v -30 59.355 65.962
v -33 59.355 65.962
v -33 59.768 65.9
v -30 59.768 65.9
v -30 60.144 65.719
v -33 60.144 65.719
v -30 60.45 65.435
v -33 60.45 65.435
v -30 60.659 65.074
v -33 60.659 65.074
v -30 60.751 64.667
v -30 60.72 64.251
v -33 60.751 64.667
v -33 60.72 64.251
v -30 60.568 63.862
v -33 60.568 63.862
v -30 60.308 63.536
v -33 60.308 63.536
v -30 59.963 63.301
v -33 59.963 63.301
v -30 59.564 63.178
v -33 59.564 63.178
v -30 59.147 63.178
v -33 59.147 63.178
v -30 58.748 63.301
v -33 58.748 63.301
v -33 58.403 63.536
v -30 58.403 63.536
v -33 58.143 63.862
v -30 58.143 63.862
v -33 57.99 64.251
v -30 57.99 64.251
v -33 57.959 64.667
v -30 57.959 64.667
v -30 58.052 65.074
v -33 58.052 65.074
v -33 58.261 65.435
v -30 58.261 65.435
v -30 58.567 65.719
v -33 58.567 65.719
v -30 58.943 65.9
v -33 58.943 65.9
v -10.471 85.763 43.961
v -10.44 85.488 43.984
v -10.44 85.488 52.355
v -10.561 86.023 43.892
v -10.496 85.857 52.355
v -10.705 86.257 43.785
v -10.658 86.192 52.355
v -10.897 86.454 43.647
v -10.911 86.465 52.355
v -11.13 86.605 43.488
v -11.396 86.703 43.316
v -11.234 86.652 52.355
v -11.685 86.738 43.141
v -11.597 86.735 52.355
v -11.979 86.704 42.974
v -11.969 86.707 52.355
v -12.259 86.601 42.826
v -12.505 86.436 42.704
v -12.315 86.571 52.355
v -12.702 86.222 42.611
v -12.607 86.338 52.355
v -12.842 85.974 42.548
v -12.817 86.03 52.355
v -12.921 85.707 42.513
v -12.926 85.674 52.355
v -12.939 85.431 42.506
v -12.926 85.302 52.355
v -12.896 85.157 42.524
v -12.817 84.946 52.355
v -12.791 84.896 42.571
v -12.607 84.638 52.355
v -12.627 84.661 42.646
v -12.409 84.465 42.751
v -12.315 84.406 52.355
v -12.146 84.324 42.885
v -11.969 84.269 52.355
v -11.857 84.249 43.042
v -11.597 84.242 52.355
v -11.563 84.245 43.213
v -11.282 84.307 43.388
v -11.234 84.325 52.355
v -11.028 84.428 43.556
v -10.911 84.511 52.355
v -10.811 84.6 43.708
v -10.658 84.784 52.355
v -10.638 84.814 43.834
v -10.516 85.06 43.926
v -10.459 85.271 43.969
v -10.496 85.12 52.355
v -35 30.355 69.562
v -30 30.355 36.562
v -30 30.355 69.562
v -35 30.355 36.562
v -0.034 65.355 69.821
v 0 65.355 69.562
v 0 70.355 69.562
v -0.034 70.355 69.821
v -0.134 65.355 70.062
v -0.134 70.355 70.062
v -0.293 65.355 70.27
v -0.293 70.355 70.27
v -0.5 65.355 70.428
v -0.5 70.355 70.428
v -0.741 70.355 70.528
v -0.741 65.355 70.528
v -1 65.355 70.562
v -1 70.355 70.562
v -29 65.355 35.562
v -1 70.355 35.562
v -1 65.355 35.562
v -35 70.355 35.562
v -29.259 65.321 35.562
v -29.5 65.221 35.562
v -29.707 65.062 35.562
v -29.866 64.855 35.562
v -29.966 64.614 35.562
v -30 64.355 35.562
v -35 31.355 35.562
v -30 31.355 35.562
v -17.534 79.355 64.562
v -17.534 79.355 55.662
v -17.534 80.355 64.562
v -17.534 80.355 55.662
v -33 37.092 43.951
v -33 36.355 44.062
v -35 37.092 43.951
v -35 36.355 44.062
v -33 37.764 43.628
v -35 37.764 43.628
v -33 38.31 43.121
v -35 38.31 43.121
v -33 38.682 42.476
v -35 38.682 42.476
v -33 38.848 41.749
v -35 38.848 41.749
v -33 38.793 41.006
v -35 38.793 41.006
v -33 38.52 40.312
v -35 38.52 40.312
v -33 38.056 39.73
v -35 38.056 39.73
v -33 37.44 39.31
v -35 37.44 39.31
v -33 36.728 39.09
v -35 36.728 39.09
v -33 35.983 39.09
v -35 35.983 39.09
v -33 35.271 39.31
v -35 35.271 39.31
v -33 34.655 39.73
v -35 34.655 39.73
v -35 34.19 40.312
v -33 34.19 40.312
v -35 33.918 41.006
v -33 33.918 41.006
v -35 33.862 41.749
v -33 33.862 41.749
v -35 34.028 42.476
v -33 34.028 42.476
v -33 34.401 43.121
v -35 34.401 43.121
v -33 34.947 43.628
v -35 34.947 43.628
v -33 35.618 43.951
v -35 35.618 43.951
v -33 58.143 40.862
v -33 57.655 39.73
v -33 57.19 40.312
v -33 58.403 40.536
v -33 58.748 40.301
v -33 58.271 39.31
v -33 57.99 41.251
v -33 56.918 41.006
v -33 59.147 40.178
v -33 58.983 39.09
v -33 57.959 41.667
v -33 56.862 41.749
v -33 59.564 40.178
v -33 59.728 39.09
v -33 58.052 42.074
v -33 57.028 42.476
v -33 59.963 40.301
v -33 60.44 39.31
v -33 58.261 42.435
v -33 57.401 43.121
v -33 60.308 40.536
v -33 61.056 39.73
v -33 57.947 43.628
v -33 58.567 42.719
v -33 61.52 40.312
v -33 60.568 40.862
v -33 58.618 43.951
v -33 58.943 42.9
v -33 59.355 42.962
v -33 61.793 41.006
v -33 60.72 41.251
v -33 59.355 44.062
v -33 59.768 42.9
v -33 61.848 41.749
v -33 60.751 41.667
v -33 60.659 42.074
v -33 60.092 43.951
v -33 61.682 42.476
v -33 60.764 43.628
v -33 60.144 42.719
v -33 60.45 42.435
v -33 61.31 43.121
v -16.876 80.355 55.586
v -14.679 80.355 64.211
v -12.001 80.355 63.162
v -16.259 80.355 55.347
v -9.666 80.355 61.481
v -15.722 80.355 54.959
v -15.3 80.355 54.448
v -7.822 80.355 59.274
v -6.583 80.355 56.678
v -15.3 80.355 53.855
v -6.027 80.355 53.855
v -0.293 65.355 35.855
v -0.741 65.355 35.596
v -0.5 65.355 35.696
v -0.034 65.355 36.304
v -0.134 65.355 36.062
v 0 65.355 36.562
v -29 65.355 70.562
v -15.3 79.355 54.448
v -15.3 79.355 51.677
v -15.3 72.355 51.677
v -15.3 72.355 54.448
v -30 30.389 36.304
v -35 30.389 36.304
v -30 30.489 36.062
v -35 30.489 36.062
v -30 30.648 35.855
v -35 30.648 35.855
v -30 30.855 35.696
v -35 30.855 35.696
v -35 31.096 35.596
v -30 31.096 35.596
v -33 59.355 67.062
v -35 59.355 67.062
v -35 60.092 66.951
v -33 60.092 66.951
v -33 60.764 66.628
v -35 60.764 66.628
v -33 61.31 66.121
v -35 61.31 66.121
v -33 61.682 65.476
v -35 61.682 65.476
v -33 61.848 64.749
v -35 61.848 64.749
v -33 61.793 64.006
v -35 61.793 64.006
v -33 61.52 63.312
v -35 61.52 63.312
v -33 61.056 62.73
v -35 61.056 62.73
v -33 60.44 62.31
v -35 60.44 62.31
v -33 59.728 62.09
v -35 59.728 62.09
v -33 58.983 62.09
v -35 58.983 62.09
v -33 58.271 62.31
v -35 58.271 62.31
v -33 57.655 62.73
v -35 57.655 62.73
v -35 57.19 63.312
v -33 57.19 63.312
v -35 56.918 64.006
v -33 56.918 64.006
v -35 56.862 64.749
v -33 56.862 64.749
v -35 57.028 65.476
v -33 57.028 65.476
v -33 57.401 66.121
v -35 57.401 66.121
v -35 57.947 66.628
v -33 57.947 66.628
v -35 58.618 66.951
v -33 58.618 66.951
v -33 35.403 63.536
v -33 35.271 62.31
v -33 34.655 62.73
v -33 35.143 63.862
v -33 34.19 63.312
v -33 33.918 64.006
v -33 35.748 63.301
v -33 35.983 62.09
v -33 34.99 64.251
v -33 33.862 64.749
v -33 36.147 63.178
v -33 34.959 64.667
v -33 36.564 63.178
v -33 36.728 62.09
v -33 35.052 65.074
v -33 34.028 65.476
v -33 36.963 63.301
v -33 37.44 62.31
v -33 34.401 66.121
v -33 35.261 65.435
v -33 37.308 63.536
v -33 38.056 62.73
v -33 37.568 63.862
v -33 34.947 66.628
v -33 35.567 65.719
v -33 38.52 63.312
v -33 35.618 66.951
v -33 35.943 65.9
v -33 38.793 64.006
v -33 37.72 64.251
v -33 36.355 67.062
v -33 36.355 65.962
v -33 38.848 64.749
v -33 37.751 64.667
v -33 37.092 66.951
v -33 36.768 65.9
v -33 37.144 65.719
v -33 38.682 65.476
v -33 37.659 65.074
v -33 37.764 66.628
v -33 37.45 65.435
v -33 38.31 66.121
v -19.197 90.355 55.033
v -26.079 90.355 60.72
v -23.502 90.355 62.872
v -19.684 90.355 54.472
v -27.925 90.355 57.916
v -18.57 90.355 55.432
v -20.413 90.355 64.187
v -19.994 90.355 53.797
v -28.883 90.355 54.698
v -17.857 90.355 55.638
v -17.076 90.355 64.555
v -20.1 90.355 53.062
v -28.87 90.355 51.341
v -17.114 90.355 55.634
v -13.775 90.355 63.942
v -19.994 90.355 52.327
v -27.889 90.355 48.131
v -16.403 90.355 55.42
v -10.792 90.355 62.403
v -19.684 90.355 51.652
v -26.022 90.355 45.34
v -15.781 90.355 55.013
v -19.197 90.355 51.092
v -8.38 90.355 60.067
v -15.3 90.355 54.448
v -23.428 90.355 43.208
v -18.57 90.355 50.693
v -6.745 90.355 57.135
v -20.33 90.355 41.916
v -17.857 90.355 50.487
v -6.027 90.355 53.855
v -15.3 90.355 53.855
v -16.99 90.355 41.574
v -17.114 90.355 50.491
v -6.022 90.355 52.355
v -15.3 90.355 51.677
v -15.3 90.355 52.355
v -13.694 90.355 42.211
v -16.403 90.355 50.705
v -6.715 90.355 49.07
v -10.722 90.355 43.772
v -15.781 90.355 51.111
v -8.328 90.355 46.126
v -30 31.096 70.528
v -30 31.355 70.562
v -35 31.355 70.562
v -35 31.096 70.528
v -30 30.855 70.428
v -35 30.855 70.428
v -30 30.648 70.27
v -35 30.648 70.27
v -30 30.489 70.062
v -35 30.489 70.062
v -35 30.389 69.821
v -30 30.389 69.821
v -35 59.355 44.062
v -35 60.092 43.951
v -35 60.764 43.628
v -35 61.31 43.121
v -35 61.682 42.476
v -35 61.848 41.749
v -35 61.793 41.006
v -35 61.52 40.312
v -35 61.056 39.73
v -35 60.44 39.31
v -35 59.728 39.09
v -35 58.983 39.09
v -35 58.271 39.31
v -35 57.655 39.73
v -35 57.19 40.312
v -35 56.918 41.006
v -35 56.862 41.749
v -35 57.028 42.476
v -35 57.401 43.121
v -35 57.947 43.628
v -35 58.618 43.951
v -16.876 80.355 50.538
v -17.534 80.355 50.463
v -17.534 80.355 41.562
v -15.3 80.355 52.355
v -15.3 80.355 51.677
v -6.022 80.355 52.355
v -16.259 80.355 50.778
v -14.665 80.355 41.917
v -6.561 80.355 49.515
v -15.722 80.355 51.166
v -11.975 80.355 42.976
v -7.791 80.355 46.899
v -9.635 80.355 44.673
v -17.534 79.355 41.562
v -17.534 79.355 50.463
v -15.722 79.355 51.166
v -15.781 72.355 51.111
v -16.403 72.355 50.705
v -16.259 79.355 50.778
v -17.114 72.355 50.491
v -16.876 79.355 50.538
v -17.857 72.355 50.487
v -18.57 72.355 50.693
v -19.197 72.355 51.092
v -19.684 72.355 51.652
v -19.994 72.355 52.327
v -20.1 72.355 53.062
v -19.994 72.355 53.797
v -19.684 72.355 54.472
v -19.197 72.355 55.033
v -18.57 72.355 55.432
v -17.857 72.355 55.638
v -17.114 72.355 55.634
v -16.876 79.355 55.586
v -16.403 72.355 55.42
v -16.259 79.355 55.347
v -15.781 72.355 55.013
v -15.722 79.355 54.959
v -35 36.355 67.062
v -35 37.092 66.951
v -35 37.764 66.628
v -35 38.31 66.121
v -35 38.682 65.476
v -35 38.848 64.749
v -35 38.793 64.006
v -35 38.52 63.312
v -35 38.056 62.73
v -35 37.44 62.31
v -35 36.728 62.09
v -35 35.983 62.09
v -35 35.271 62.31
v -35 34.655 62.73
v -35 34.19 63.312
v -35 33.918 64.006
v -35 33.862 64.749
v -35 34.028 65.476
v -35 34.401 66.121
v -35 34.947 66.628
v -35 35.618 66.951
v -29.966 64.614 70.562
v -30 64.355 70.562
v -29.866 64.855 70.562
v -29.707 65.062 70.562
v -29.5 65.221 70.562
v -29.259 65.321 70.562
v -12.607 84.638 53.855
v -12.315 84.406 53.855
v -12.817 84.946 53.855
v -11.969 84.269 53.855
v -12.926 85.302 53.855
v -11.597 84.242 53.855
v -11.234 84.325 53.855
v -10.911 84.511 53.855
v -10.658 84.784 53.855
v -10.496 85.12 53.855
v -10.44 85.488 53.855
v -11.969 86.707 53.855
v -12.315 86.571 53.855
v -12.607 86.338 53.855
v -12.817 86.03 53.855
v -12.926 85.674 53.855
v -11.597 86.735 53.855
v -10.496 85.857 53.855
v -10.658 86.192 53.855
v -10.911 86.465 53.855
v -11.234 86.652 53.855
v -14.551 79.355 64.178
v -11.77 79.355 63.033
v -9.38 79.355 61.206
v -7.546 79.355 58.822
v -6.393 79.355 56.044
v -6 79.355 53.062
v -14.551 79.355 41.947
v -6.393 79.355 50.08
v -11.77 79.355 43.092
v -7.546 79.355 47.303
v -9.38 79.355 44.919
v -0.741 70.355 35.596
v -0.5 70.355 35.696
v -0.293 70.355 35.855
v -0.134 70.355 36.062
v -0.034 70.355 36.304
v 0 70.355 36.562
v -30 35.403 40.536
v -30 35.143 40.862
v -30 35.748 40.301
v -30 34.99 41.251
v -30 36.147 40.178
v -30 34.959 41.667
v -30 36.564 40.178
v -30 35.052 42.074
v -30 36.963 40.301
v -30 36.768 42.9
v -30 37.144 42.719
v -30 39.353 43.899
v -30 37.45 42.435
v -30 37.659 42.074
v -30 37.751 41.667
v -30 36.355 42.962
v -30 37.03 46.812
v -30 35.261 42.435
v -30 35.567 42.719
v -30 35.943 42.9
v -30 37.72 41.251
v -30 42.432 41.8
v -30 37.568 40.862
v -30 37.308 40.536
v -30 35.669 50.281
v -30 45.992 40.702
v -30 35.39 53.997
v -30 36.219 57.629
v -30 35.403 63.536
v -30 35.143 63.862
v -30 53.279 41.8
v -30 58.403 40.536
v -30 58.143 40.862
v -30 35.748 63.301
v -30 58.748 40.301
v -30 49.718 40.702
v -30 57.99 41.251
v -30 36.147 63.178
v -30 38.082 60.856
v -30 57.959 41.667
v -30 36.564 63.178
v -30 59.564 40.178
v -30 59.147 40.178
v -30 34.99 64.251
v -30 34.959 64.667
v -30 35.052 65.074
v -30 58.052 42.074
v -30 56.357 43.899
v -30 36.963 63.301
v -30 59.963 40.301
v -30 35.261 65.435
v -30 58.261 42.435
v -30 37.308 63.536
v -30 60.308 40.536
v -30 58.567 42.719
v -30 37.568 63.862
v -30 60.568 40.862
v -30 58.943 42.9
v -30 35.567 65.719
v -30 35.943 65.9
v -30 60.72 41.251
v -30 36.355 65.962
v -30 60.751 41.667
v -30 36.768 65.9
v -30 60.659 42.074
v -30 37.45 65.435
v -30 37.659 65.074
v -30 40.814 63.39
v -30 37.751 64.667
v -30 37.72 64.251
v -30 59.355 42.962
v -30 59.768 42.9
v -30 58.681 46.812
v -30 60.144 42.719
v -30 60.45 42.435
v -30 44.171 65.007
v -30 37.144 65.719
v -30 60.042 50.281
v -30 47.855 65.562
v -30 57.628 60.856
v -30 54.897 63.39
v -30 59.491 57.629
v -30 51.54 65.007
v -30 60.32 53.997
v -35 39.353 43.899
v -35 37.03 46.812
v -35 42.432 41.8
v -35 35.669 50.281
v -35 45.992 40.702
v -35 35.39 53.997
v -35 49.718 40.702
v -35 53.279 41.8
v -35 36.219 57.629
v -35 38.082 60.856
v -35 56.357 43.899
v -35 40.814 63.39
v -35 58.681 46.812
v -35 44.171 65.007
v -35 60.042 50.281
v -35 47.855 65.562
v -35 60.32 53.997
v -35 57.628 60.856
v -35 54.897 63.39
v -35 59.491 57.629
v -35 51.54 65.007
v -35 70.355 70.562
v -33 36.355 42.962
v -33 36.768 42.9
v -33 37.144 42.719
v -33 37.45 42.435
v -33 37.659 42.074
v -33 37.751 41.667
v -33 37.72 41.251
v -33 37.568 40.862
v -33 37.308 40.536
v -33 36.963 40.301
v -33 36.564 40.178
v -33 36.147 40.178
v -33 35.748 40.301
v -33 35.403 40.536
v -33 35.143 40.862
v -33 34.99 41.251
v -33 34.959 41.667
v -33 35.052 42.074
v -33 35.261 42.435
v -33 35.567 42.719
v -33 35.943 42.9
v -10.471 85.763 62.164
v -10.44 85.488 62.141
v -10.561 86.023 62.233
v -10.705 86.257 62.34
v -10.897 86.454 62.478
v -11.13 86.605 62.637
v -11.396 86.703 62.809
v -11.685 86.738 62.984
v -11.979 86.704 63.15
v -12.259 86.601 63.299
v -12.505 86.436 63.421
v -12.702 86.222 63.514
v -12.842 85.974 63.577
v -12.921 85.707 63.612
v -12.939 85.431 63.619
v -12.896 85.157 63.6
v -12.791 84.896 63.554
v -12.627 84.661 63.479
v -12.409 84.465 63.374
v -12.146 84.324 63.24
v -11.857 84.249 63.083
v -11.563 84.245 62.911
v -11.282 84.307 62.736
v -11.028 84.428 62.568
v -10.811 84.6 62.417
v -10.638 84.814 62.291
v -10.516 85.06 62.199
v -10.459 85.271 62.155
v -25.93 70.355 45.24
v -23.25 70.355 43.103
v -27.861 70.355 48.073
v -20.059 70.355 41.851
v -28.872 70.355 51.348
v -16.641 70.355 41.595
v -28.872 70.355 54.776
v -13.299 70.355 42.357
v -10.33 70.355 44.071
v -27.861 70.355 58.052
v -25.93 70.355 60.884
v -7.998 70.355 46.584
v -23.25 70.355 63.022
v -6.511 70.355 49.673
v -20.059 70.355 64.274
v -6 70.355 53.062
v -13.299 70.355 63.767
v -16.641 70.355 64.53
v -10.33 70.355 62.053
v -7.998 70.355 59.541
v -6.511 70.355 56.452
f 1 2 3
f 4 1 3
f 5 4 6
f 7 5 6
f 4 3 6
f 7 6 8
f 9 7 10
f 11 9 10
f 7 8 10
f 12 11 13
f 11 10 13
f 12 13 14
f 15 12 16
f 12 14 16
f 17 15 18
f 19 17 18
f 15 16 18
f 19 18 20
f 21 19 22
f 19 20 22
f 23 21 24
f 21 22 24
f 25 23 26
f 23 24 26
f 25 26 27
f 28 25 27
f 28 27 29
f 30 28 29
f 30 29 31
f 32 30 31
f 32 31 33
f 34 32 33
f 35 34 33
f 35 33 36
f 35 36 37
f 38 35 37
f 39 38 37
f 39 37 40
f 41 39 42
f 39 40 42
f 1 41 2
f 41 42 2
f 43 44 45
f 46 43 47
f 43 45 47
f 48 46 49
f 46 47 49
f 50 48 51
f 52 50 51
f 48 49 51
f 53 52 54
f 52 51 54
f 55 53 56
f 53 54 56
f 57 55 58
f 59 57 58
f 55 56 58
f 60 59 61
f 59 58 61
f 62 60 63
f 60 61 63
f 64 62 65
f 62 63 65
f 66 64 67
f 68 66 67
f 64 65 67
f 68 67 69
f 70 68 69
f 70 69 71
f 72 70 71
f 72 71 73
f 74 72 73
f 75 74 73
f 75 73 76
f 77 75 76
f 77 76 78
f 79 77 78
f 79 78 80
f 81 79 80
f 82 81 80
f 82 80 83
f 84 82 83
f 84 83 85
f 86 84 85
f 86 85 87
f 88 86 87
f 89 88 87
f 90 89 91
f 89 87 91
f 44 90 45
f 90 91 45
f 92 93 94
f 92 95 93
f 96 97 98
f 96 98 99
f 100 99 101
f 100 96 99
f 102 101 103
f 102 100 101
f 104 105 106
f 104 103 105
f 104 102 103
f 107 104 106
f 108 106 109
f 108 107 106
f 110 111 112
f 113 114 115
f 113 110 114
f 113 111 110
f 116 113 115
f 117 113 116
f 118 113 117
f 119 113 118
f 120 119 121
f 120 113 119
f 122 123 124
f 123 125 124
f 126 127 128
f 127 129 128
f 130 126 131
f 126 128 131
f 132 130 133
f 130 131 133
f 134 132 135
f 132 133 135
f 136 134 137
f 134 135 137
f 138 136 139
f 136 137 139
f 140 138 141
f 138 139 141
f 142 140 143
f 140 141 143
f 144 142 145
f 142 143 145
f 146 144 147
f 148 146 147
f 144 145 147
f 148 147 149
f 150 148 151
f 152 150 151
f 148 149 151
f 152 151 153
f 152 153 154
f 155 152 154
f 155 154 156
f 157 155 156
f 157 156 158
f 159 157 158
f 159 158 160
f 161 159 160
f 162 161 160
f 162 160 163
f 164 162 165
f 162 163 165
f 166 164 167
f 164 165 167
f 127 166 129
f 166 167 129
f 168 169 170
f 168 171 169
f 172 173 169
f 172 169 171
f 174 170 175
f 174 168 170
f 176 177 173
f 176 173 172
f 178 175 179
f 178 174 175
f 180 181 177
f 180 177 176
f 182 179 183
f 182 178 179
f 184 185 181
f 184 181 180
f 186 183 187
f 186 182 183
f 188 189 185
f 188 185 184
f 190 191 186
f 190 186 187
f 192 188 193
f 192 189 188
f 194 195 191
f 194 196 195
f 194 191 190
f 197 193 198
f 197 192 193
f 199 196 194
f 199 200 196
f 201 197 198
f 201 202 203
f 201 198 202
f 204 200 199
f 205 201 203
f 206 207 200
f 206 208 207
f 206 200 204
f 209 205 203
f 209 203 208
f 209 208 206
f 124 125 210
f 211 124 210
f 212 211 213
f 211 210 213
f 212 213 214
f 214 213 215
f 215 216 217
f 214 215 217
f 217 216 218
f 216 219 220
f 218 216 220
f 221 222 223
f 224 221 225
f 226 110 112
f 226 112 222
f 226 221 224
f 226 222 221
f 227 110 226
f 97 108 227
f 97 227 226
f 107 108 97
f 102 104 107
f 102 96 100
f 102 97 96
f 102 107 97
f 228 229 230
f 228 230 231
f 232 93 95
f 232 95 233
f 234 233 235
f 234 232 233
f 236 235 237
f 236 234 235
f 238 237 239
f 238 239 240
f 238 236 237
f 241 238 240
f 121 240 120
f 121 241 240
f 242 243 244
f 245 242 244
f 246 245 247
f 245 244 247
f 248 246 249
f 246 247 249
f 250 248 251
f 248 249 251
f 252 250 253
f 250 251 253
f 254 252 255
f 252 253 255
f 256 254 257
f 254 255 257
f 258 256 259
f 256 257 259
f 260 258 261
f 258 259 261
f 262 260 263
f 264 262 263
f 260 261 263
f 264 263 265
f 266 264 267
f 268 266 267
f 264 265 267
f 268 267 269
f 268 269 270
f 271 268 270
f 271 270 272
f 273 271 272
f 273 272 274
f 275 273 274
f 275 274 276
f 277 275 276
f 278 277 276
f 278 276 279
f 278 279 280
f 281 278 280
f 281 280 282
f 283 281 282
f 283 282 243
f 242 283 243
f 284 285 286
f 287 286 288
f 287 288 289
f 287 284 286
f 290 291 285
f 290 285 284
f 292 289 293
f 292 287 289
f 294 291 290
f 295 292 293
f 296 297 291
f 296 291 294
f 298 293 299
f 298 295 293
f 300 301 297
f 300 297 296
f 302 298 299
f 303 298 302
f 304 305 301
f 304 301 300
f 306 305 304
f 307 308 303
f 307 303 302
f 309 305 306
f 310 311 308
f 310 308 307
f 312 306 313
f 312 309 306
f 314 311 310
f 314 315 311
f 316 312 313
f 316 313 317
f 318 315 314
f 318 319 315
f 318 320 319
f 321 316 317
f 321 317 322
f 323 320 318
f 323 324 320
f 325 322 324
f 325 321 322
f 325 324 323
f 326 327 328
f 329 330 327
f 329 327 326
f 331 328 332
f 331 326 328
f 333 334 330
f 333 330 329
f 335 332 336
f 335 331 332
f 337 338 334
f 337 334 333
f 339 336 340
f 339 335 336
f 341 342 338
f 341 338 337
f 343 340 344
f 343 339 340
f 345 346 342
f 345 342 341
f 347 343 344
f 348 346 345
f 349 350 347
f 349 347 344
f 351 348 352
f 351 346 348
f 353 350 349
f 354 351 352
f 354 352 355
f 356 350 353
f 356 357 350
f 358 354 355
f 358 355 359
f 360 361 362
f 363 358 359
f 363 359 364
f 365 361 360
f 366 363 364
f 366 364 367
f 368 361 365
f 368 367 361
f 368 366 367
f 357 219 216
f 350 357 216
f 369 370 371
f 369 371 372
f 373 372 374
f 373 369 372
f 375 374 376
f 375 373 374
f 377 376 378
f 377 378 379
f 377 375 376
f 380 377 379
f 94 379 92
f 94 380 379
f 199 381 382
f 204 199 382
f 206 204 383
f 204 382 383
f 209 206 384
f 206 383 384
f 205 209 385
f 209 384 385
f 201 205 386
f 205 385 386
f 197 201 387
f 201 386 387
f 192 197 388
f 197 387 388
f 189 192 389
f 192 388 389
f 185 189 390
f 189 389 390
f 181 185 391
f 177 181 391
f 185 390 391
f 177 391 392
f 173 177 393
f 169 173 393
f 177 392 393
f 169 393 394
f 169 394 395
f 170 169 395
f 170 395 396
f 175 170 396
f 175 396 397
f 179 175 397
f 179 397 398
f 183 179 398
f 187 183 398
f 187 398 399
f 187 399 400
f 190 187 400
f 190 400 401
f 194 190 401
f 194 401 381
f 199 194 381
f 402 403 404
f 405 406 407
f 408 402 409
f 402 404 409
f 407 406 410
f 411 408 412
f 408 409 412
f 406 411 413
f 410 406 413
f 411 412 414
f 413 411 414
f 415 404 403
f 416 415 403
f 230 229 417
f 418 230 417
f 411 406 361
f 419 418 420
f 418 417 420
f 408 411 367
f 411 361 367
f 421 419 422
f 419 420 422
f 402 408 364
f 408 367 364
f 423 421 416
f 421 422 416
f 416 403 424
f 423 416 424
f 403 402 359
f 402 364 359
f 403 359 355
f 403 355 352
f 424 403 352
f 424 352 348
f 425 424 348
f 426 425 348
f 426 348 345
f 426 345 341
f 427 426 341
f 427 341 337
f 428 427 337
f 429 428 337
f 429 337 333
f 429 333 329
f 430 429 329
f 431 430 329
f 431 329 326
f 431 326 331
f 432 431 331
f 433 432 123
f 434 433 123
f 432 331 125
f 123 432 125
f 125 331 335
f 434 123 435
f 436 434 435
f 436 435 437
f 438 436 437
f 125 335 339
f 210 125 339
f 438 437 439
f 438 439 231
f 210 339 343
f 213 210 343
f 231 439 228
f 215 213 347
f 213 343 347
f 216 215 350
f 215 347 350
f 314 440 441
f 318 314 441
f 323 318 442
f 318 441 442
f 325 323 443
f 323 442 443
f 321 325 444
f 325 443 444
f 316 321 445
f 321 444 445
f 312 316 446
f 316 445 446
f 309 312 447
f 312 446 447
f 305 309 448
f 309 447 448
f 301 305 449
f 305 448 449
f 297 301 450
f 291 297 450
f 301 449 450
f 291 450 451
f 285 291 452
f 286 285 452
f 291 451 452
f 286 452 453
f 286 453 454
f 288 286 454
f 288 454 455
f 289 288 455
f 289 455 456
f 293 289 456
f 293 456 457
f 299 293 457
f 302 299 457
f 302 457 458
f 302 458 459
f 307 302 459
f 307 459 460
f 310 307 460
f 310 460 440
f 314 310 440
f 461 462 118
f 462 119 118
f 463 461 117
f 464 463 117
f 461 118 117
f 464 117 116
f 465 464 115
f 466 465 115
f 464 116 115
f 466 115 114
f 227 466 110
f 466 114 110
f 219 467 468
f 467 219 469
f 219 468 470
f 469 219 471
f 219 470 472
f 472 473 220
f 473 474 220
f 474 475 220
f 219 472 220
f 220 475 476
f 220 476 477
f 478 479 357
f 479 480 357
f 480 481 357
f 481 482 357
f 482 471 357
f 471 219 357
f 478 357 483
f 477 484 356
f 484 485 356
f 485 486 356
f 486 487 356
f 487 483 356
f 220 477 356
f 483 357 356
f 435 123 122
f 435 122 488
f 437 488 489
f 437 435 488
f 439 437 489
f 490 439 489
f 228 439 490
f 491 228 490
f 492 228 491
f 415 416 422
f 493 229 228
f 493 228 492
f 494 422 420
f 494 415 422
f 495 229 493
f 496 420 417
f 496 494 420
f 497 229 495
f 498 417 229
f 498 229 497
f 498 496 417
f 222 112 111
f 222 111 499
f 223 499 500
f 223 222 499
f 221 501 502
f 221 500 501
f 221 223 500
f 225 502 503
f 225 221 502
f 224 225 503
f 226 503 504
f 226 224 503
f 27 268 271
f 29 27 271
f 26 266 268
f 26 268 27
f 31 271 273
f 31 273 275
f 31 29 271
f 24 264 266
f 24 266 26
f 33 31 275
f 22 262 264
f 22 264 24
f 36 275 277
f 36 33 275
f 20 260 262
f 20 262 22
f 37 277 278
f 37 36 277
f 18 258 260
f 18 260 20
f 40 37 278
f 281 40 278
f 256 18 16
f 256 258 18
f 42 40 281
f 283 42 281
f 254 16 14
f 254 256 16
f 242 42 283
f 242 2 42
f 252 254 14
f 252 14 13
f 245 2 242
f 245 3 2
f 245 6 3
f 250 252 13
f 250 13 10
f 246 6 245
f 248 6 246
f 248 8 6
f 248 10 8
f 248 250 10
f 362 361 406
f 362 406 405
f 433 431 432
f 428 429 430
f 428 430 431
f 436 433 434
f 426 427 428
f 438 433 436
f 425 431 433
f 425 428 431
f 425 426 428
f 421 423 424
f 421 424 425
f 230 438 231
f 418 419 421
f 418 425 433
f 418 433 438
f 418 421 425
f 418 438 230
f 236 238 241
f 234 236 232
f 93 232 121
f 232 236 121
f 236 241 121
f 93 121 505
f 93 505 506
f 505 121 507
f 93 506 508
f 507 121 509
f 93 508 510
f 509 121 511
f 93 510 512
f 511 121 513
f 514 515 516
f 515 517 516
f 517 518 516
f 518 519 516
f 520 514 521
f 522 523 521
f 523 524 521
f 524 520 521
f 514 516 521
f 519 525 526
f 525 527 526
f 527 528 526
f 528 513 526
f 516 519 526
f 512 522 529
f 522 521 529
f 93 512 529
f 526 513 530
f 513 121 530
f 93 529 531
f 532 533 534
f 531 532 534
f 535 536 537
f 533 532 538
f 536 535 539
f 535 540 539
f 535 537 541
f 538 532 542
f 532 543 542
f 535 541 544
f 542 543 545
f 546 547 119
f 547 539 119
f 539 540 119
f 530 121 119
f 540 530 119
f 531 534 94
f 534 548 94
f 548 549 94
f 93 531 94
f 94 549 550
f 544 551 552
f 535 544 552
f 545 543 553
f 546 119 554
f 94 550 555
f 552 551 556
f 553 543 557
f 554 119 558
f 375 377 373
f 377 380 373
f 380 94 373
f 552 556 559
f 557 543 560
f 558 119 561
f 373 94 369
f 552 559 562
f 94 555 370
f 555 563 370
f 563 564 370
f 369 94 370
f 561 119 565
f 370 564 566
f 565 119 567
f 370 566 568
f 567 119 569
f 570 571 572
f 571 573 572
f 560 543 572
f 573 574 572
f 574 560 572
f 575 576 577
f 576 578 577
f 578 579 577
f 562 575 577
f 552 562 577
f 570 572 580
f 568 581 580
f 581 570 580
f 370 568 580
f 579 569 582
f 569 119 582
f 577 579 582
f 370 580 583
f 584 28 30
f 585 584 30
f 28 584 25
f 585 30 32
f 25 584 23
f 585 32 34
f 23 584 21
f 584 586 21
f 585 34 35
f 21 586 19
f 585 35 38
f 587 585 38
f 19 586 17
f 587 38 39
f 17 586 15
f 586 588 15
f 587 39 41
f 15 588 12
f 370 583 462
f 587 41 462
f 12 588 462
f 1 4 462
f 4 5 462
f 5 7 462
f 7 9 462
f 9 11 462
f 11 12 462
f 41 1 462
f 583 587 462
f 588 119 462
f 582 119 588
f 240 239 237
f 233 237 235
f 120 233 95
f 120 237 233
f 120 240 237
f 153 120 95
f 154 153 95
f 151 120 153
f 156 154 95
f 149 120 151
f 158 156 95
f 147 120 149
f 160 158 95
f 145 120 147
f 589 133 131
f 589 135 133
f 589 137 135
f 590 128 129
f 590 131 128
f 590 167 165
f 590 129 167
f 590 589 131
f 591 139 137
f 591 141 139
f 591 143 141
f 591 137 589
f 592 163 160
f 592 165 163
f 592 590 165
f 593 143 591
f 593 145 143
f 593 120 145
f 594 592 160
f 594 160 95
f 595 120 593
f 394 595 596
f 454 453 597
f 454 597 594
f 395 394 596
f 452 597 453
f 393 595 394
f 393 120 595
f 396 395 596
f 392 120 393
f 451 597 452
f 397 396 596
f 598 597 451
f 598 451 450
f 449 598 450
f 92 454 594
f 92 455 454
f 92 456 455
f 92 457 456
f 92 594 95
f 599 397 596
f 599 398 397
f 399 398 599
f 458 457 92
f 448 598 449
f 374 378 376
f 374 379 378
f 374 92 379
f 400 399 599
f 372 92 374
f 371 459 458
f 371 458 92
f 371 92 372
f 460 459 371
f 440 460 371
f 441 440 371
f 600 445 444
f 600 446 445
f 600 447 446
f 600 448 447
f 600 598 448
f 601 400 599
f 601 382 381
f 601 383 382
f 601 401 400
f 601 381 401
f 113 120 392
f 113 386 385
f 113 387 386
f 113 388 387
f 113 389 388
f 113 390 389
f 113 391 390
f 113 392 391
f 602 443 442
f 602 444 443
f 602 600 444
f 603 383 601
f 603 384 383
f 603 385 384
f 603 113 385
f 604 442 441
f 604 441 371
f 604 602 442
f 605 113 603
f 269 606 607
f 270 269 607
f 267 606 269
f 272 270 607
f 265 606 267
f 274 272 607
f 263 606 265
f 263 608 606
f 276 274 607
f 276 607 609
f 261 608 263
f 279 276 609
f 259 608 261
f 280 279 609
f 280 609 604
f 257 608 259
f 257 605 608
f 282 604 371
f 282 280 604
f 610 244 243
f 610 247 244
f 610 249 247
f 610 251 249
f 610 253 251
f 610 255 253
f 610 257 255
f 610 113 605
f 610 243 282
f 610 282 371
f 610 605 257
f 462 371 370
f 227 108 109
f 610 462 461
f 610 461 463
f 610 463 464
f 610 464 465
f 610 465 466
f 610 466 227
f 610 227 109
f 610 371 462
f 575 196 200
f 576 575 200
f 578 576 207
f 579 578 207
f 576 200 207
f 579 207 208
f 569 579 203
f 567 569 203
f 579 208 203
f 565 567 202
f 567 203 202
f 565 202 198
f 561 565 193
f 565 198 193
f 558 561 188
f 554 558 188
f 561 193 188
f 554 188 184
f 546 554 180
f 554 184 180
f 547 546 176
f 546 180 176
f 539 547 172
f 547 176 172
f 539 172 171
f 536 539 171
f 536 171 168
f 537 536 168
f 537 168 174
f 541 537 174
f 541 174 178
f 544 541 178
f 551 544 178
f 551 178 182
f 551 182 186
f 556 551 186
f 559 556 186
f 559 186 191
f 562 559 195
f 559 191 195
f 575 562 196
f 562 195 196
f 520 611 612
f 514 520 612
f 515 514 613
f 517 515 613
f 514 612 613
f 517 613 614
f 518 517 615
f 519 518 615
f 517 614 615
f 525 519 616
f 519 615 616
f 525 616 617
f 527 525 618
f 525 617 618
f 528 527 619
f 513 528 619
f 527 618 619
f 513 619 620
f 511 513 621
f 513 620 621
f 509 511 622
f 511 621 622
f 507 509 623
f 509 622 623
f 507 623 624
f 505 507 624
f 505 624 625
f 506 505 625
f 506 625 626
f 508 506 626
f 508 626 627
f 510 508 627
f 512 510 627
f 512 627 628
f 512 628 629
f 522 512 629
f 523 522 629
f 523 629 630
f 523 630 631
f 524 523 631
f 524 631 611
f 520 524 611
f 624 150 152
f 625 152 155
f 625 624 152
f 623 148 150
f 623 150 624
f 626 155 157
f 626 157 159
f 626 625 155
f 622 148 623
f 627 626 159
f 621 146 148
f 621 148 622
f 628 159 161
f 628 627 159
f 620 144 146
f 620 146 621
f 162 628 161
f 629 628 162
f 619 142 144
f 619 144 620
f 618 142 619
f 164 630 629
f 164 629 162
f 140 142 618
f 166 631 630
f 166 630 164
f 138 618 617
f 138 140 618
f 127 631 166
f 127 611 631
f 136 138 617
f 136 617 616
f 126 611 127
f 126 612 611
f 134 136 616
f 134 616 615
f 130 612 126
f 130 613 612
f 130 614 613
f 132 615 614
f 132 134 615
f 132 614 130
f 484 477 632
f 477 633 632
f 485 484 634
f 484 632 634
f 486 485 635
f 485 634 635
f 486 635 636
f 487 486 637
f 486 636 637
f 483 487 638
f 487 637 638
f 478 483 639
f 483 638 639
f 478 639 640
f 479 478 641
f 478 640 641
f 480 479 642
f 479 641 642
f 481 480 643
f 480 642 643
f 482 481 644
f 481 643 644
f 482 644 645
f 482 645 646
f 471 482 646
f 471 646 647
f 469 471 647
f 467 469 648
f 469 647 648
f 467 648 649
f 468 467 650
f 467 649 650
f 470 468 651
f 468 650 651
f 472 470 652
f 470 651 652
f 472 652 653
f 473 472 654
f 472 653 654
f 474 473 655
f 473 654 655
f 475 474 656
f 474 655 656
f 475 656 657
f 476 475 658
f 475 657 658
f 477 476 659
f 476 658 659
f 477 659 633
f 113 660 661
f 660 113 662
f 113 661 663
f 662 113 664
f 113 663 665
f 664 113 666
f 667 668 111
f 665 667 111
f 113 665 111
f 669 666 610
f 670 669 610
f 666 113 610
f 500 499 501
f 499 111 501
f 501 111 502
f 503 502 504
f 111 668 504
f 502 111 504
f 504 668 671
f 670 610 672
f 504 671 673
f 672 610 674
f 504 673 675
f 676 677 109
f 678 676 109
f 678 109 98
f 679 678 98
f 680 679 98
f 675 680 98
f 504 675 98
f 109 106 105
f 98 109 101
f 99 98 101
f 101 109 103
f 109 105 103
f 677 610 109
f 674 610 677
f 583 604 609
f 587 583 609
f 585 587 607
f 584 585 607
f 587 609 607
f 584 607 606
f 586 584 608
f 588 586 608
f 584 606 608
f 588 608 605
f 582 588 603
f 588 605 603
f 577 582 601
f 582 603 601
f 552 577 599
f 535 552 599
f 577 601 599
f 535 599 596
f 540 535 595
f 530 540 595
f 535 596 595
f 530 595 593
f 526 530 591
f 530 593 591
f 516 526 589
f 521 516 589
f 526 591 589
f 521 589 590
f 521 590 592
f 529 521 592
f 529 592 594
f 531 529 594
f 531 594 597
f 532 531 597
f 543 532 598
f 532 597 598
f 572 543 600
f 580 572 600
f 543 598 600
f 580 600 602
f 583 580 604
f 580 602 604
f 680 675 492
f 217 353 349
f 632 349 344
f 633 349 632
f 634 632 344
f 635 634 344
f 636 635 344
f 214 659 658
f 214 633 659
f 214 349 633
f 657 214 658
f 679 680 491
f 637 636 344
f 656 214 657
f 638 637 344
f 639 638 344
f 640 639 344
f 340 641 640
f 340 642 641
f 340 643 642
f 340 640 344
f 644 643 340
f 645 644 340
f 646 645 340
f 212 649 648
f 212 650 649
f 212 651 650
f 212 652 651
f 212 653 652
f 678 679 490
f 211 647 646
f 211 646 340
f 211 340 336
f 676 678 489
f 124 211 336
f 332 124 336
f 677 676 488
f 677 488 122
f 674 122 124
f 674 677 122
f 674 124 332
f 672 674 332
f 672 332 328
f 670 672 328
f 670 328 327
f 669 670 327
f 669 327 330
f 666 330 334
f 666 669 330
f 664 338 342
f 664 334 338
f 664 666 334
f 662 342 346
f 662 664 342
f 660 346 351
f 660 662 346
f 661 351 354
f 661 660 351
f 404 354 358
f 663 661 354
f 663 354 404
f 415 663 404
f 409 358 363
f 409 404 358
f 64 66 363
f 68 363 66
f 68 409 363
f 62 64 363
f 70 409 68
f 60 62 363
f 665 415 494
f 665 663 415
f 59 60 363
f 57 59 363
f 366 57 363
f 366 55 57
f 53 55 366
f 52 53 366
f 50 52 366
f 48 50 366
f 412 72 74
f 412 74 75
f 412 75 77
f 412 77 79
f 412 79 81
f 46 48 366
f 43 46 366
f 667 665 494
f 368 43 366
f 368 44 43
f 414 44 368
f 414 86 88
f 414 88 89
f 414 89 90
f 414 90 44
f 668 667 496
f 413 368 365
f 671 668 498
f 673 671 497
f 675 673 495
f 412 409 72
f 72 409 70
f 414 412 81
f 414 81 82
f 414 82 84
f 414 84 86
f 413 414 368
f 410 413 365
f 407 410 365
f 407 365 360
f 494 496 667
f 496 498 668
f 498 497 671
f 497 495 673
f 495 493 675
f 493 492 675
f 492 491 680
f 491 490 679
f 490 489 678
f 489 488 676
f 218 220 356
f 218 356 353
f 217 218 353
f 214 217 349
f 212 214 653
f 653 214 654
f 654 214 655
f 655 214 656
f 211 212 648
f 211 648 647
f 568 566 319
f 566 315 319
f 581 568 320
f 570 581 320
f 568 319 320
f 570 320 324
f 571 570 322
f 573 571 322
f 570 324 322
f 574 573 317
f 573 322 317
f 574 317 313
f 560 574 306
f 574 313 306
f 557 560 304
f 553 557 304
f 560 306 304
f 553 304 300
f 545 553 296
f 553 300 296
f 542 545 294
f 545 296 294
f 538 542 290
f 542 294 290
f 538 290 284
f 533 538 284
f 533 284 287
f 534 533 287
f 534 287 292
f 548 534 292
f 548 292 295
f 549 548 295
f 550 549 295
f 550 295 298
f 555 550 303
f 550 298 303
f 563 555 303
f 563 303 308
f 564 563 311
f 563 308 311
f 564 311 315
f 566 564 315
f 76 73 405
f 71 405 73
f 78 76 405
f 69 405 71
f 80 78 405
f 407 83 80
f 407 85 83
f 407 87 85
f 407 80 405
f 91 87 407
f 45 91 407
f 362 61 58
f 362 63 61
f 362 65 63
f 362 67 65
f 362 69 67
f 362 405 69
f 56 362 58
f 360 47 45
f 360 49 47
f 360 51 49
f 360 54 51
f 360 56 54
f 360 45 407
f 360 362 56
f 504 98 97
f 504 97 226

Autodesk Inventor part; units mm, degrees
ref_plane "Arbeitsebene10" through (-35, 70.3553, 70.3553) normal (0, 1, 0) x (1, 0, 0)
sketch "Skizze7" plane through (-35, 70.3553, 70.3553) normal (0, 1, 0) x (1, 0, 0)
  circle A0 centre (17.5, 17.2929) radius 11.5
  point P0 (35, 70.3553)
  dimension "d32" = 23
extrude "Achshalter" add sketch "Skizze7" along normal blind 20
ref_plane "Arbeitsebene11" through (-17.5, 90.3553, 53.0624) normal (0, 1, 0) x (1, 0, 0)
sketch "Skizze16" plane through (-17.5, 90.3553, 53.0624) normal (0, 1, 0) x (1, 0, 0)
  circle A0 centre (0, 0) radius 11.5 projected
  arc A1 (2.2, 1.3856) -> (2.2, -1.3856) centre (0, 0) ccw
  line L0 (2.2, 1.3856) -> (2.2, -1.3856)
  point P0 (17.5, 53.0624)
  dimension "d54" = 5.2
  dimension "d55" = 2.2
extrude "Extrusion11" cut sketch "Skizze16" against normal blind 18 contours L0 A1
ref_plane "Arbeitsebene2" through (-35, 80.3553, 35.7696) normal (0, 1, 0) x (1, 0, 0)
sketch "Skizze17" plane through (-35, 80.3553, 35.7696) normal (0, 1, 0) x (1, 0, 0)
  line L0 (30.7802, -4.1446) -> (17.4658, -4.1446)
  line L1 (17.4658, -4.1446) -> (17.4658, -31.1746)
  line L2 (17.4658, -31.1746) -> (30.7802, -31.1746)
  line L3 (30.7802, -31.1746) -> (30.7802, -4.1446)
  point P0 (35, 35.7696)
extrude "Extrusion12" cut sketch "Skizze17" against normal blind 1
ref_plane "Arbeitsebene16" through (-34, 67.3553, 52.8553) normal (0, 0, 1) x (1, 0, 0)
sketch "Skizze18" plane through (-34, 67.3553, 52.8553) normal (0, 0, 1) x (1, 0, 0)
  line L0 (29.7456, 25.5785) -> (16.4577, 25.5785)
  line L1 (16.4577, 25.5785) -> (16.4577, 12.5204)
  line L2 (16.4577, 12.5204) -> (29.7456, 12.5204)
  line L3 (29.7456, 12.5204) -> (29.7456, 25.5785)
  point P0 (34, -67.3553)
extrude "Extrusion13" cut sketch "Skizze18" along normal blind 1 and the other way blind 0.5
ref_plane "Arbeitsebene17" through (-34, 67.3553, 70.3553) normal (0, 0, 1) x (1, 0, 0)
sketch "Skizze19" plane through (-34, 67.3553, 70.3553) normal (0, 0, 1) x (1, 0, 0)
  circle A0 centre (22.3096, 18.1328) radius 1.25
  point P0 (34, -67.3553)
  dimension "d67" = 2.5
extrude "Extrusion14" cut sketch "Skizze19" against normal blind 35
sketch "Skizze24" plane through (-17.5, 70.3553, 53.0624) normal (0, -1, 0) x (1, 0, 0)
  line L0 (-17.5, 17.5) -> (17.5, 17.5)
  line L1 (17.5, 17.5) -> (17.5, -17.5)
  line L2 (17.5, -17.5) -> (-17.5, -17.5)
  line L3 (-17.5, -17.5) -> (-17.5, 17.5)
  point P0 (0, 0)
  point P1 (17.5, -53.0624)
  dimension "d90" = 35
  dimension "d91" = 35
  dimension "d92" = 17.5
  dimension "d93" = 17.5
extrude "Extrusion17" add sketch "Skizze24" along normal blind 5
sketch "Skizze25" plane through (-35, 70.3553, 35.5624) normal (-1, 0, 0) x (0, 0, 1)
  line L0 (35, -5) -> (0, -5)
  line L1 (0, -5) -> (0, -40)
  line L2 (0, -40) -> (35, -40)
  line L3 (35, -40) -> (35, -5)
  point P0 (-35.5624, -70.3553)
  dimension "d96" = 35
  dimension "d97" = 35
extrude "Extrusion18" add sketch "Skizze25" against normal blind 5
fillet "Rundung14" radius 1 1 edges at (-30, 65.3553, 53.0624)
fillet "Rundung15" radius 1 4 edges at (0, 67.8553, 70.5624) (0, 67.8553, 35.5624) (-32.5, 30.3553, 35.5624) (-32.5, 30.3553, 70.5624)
sketch "Skizze26" plane through (-35, 70.3553, 35.5624) normal (-1, 0, 0) x (0, 0, 1)
  line L0 (1, -40) -> (34, -40) projected
  circle A0 centre (17.5, -22.5) radius 12.5
  point P0 (-35.5624, -70.3553)
  dimension "d102" = 25
  dimension "d103" = 17.5
extrude "Extrusion19" cut sketch "Skizze26" against normal up to surface (5 mm away)
sketch "Skizze27" plane through (-35, 70.3553, 35.5624) normal (-1, 0, 0) x (0, 0, 1)
  circle A0 centre (29, -34) radius 1.4
  circle A1 centre (29, -11) radius 1.4
  circle A2 centre (6, -11) radius 1.4
  circle A3 centre (6, -34) radius 1.4
  point P0 (-35.5624, -70.3553)
  dimension "d106" = 2.8
  dimension "d107" = 2.8
  dimension "d108" = 2.8
  dimension "d109" = 2.8
  dimension "d110" = 23
  dimension "d111" = 23
  dimension "d112" = 23
  dimension "d113" = 23
extrude "Extrusion20" cut sketch "Skizze27" against normal up to surface (5 mm away)
sketch "Skizze28" plane through (-35, 70.3553, 35.5624) normal (-1, 0, 0) x (0, 0, 1)
  circle A0 centre (29, -34) radius 1.4 projected
  circle A1 centre (29, -11) radius 1.4 projected
  circle A2 centre (6, -34) radius 1.4 projected
  circle A3 centre (6, -11) radius 1.4 projected
  circle A4 centre (29, -11) radius 2.5
  circle A5 centre (29, -34) radius 2.5
  circle A6 centre (6, -11) radius 2.5
  circle A7 centre (6, -34) radius 2.5
  point P0 (-35.5624, -70.3553)
  dimension "d116" = 5
  dimension "d117" = 5
  dimension "d118" = 5
  dimension "d119" = 5
extrude "Extrusion21" cut sketch "Skizze28" against normal blind 2
properties part number "zweifach nema v2"
